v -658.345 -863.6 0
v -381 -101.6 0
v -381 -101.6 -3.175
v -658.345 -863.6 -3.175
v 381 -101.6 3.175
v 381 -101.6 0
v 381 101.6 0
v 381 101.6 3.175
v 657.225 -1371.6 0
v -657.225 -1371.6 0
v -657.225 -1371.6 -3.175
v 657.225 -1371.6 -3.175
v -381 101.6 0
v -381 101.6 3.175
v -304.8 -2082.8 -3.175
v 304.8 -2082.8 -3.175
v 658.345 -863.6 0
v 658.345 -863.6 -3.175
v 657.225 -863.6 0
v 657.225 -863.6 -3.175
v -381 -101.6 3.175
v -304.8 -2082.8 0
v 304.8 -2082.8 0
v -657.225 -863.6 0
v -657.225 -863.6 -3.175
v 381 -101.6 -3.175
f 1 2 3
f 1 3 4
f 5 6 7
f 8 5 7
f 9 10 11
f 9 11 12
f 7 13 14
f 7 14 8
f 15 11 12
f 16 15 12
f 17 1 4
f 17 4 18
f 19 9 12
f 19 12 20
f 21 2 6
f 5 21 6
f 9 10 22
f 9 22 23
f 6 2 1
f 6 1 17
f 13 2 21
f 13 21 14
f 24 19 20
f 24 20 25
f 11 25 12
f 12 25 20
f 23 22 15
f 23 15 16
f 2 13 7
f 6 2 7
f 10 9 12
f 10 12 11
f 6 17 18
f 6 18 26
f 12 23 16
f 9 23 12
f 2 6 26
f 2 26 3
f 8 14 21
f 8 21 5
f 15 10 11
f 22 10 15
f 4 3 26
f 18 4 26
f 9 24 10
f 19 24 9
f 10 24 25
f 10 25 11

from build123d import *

# Parameters (mm, degrees)
F0_W     = 762
F0_H     = 203.2
F1_DEPTH = 3.175
F3_DEPTH = 3.175
F5_DEPTH = 3.175
F7_DEPTH = 3.175


with BuildPart() as f1:
    # F0 (on Top) → F1 (new body)
    with BuildSketch(Plane.XY):
        Rectangle(F0_W, F0_H)
    extrude(amount=F1_DEPTH)

    # F2 (on Top) → F3 (join)
    with BuildSketch(Plane.XY):
        Polygon((658.345319, -863.6), (381, -101.6), (0, -101.6), (0, -863.6), align=None)
        Polygon((0, -863.6), (0, -101.6), (-381, -101.6), (-658.345319, -863.6), align=None)
    extrude(amount=-F3_DEPTH)


with BuildPart() as f5:
    # F4 (on Top) → F5 (new body)
    with BuildSketch(Plane.XY):
        Polygon((0, -863.6), (-657.225, -863.6), (-657.225, -1371.6), (657.225, -1371.6), (657.225, -863.6), align=None)
    extrude(amount=-F5_DEPTH)


with BuildPart() as f7:
    # F6 (on Top) → F7 (new body)
    with BuildSketch(Plane.XY):
        Polygon((0, -1371.6), (-657.225, -1371.6), (-304.8, -2082.8), (0, -2082.8), align=None)
        Polygon((657.225, -1371.6), (0, -1371.6), (0, -2082.8), (304.8, -2082.8), align=None)
    extrude(amount=-F7_DEPTH)


solid = Compound([f1.part, f5.part, f7.part])
